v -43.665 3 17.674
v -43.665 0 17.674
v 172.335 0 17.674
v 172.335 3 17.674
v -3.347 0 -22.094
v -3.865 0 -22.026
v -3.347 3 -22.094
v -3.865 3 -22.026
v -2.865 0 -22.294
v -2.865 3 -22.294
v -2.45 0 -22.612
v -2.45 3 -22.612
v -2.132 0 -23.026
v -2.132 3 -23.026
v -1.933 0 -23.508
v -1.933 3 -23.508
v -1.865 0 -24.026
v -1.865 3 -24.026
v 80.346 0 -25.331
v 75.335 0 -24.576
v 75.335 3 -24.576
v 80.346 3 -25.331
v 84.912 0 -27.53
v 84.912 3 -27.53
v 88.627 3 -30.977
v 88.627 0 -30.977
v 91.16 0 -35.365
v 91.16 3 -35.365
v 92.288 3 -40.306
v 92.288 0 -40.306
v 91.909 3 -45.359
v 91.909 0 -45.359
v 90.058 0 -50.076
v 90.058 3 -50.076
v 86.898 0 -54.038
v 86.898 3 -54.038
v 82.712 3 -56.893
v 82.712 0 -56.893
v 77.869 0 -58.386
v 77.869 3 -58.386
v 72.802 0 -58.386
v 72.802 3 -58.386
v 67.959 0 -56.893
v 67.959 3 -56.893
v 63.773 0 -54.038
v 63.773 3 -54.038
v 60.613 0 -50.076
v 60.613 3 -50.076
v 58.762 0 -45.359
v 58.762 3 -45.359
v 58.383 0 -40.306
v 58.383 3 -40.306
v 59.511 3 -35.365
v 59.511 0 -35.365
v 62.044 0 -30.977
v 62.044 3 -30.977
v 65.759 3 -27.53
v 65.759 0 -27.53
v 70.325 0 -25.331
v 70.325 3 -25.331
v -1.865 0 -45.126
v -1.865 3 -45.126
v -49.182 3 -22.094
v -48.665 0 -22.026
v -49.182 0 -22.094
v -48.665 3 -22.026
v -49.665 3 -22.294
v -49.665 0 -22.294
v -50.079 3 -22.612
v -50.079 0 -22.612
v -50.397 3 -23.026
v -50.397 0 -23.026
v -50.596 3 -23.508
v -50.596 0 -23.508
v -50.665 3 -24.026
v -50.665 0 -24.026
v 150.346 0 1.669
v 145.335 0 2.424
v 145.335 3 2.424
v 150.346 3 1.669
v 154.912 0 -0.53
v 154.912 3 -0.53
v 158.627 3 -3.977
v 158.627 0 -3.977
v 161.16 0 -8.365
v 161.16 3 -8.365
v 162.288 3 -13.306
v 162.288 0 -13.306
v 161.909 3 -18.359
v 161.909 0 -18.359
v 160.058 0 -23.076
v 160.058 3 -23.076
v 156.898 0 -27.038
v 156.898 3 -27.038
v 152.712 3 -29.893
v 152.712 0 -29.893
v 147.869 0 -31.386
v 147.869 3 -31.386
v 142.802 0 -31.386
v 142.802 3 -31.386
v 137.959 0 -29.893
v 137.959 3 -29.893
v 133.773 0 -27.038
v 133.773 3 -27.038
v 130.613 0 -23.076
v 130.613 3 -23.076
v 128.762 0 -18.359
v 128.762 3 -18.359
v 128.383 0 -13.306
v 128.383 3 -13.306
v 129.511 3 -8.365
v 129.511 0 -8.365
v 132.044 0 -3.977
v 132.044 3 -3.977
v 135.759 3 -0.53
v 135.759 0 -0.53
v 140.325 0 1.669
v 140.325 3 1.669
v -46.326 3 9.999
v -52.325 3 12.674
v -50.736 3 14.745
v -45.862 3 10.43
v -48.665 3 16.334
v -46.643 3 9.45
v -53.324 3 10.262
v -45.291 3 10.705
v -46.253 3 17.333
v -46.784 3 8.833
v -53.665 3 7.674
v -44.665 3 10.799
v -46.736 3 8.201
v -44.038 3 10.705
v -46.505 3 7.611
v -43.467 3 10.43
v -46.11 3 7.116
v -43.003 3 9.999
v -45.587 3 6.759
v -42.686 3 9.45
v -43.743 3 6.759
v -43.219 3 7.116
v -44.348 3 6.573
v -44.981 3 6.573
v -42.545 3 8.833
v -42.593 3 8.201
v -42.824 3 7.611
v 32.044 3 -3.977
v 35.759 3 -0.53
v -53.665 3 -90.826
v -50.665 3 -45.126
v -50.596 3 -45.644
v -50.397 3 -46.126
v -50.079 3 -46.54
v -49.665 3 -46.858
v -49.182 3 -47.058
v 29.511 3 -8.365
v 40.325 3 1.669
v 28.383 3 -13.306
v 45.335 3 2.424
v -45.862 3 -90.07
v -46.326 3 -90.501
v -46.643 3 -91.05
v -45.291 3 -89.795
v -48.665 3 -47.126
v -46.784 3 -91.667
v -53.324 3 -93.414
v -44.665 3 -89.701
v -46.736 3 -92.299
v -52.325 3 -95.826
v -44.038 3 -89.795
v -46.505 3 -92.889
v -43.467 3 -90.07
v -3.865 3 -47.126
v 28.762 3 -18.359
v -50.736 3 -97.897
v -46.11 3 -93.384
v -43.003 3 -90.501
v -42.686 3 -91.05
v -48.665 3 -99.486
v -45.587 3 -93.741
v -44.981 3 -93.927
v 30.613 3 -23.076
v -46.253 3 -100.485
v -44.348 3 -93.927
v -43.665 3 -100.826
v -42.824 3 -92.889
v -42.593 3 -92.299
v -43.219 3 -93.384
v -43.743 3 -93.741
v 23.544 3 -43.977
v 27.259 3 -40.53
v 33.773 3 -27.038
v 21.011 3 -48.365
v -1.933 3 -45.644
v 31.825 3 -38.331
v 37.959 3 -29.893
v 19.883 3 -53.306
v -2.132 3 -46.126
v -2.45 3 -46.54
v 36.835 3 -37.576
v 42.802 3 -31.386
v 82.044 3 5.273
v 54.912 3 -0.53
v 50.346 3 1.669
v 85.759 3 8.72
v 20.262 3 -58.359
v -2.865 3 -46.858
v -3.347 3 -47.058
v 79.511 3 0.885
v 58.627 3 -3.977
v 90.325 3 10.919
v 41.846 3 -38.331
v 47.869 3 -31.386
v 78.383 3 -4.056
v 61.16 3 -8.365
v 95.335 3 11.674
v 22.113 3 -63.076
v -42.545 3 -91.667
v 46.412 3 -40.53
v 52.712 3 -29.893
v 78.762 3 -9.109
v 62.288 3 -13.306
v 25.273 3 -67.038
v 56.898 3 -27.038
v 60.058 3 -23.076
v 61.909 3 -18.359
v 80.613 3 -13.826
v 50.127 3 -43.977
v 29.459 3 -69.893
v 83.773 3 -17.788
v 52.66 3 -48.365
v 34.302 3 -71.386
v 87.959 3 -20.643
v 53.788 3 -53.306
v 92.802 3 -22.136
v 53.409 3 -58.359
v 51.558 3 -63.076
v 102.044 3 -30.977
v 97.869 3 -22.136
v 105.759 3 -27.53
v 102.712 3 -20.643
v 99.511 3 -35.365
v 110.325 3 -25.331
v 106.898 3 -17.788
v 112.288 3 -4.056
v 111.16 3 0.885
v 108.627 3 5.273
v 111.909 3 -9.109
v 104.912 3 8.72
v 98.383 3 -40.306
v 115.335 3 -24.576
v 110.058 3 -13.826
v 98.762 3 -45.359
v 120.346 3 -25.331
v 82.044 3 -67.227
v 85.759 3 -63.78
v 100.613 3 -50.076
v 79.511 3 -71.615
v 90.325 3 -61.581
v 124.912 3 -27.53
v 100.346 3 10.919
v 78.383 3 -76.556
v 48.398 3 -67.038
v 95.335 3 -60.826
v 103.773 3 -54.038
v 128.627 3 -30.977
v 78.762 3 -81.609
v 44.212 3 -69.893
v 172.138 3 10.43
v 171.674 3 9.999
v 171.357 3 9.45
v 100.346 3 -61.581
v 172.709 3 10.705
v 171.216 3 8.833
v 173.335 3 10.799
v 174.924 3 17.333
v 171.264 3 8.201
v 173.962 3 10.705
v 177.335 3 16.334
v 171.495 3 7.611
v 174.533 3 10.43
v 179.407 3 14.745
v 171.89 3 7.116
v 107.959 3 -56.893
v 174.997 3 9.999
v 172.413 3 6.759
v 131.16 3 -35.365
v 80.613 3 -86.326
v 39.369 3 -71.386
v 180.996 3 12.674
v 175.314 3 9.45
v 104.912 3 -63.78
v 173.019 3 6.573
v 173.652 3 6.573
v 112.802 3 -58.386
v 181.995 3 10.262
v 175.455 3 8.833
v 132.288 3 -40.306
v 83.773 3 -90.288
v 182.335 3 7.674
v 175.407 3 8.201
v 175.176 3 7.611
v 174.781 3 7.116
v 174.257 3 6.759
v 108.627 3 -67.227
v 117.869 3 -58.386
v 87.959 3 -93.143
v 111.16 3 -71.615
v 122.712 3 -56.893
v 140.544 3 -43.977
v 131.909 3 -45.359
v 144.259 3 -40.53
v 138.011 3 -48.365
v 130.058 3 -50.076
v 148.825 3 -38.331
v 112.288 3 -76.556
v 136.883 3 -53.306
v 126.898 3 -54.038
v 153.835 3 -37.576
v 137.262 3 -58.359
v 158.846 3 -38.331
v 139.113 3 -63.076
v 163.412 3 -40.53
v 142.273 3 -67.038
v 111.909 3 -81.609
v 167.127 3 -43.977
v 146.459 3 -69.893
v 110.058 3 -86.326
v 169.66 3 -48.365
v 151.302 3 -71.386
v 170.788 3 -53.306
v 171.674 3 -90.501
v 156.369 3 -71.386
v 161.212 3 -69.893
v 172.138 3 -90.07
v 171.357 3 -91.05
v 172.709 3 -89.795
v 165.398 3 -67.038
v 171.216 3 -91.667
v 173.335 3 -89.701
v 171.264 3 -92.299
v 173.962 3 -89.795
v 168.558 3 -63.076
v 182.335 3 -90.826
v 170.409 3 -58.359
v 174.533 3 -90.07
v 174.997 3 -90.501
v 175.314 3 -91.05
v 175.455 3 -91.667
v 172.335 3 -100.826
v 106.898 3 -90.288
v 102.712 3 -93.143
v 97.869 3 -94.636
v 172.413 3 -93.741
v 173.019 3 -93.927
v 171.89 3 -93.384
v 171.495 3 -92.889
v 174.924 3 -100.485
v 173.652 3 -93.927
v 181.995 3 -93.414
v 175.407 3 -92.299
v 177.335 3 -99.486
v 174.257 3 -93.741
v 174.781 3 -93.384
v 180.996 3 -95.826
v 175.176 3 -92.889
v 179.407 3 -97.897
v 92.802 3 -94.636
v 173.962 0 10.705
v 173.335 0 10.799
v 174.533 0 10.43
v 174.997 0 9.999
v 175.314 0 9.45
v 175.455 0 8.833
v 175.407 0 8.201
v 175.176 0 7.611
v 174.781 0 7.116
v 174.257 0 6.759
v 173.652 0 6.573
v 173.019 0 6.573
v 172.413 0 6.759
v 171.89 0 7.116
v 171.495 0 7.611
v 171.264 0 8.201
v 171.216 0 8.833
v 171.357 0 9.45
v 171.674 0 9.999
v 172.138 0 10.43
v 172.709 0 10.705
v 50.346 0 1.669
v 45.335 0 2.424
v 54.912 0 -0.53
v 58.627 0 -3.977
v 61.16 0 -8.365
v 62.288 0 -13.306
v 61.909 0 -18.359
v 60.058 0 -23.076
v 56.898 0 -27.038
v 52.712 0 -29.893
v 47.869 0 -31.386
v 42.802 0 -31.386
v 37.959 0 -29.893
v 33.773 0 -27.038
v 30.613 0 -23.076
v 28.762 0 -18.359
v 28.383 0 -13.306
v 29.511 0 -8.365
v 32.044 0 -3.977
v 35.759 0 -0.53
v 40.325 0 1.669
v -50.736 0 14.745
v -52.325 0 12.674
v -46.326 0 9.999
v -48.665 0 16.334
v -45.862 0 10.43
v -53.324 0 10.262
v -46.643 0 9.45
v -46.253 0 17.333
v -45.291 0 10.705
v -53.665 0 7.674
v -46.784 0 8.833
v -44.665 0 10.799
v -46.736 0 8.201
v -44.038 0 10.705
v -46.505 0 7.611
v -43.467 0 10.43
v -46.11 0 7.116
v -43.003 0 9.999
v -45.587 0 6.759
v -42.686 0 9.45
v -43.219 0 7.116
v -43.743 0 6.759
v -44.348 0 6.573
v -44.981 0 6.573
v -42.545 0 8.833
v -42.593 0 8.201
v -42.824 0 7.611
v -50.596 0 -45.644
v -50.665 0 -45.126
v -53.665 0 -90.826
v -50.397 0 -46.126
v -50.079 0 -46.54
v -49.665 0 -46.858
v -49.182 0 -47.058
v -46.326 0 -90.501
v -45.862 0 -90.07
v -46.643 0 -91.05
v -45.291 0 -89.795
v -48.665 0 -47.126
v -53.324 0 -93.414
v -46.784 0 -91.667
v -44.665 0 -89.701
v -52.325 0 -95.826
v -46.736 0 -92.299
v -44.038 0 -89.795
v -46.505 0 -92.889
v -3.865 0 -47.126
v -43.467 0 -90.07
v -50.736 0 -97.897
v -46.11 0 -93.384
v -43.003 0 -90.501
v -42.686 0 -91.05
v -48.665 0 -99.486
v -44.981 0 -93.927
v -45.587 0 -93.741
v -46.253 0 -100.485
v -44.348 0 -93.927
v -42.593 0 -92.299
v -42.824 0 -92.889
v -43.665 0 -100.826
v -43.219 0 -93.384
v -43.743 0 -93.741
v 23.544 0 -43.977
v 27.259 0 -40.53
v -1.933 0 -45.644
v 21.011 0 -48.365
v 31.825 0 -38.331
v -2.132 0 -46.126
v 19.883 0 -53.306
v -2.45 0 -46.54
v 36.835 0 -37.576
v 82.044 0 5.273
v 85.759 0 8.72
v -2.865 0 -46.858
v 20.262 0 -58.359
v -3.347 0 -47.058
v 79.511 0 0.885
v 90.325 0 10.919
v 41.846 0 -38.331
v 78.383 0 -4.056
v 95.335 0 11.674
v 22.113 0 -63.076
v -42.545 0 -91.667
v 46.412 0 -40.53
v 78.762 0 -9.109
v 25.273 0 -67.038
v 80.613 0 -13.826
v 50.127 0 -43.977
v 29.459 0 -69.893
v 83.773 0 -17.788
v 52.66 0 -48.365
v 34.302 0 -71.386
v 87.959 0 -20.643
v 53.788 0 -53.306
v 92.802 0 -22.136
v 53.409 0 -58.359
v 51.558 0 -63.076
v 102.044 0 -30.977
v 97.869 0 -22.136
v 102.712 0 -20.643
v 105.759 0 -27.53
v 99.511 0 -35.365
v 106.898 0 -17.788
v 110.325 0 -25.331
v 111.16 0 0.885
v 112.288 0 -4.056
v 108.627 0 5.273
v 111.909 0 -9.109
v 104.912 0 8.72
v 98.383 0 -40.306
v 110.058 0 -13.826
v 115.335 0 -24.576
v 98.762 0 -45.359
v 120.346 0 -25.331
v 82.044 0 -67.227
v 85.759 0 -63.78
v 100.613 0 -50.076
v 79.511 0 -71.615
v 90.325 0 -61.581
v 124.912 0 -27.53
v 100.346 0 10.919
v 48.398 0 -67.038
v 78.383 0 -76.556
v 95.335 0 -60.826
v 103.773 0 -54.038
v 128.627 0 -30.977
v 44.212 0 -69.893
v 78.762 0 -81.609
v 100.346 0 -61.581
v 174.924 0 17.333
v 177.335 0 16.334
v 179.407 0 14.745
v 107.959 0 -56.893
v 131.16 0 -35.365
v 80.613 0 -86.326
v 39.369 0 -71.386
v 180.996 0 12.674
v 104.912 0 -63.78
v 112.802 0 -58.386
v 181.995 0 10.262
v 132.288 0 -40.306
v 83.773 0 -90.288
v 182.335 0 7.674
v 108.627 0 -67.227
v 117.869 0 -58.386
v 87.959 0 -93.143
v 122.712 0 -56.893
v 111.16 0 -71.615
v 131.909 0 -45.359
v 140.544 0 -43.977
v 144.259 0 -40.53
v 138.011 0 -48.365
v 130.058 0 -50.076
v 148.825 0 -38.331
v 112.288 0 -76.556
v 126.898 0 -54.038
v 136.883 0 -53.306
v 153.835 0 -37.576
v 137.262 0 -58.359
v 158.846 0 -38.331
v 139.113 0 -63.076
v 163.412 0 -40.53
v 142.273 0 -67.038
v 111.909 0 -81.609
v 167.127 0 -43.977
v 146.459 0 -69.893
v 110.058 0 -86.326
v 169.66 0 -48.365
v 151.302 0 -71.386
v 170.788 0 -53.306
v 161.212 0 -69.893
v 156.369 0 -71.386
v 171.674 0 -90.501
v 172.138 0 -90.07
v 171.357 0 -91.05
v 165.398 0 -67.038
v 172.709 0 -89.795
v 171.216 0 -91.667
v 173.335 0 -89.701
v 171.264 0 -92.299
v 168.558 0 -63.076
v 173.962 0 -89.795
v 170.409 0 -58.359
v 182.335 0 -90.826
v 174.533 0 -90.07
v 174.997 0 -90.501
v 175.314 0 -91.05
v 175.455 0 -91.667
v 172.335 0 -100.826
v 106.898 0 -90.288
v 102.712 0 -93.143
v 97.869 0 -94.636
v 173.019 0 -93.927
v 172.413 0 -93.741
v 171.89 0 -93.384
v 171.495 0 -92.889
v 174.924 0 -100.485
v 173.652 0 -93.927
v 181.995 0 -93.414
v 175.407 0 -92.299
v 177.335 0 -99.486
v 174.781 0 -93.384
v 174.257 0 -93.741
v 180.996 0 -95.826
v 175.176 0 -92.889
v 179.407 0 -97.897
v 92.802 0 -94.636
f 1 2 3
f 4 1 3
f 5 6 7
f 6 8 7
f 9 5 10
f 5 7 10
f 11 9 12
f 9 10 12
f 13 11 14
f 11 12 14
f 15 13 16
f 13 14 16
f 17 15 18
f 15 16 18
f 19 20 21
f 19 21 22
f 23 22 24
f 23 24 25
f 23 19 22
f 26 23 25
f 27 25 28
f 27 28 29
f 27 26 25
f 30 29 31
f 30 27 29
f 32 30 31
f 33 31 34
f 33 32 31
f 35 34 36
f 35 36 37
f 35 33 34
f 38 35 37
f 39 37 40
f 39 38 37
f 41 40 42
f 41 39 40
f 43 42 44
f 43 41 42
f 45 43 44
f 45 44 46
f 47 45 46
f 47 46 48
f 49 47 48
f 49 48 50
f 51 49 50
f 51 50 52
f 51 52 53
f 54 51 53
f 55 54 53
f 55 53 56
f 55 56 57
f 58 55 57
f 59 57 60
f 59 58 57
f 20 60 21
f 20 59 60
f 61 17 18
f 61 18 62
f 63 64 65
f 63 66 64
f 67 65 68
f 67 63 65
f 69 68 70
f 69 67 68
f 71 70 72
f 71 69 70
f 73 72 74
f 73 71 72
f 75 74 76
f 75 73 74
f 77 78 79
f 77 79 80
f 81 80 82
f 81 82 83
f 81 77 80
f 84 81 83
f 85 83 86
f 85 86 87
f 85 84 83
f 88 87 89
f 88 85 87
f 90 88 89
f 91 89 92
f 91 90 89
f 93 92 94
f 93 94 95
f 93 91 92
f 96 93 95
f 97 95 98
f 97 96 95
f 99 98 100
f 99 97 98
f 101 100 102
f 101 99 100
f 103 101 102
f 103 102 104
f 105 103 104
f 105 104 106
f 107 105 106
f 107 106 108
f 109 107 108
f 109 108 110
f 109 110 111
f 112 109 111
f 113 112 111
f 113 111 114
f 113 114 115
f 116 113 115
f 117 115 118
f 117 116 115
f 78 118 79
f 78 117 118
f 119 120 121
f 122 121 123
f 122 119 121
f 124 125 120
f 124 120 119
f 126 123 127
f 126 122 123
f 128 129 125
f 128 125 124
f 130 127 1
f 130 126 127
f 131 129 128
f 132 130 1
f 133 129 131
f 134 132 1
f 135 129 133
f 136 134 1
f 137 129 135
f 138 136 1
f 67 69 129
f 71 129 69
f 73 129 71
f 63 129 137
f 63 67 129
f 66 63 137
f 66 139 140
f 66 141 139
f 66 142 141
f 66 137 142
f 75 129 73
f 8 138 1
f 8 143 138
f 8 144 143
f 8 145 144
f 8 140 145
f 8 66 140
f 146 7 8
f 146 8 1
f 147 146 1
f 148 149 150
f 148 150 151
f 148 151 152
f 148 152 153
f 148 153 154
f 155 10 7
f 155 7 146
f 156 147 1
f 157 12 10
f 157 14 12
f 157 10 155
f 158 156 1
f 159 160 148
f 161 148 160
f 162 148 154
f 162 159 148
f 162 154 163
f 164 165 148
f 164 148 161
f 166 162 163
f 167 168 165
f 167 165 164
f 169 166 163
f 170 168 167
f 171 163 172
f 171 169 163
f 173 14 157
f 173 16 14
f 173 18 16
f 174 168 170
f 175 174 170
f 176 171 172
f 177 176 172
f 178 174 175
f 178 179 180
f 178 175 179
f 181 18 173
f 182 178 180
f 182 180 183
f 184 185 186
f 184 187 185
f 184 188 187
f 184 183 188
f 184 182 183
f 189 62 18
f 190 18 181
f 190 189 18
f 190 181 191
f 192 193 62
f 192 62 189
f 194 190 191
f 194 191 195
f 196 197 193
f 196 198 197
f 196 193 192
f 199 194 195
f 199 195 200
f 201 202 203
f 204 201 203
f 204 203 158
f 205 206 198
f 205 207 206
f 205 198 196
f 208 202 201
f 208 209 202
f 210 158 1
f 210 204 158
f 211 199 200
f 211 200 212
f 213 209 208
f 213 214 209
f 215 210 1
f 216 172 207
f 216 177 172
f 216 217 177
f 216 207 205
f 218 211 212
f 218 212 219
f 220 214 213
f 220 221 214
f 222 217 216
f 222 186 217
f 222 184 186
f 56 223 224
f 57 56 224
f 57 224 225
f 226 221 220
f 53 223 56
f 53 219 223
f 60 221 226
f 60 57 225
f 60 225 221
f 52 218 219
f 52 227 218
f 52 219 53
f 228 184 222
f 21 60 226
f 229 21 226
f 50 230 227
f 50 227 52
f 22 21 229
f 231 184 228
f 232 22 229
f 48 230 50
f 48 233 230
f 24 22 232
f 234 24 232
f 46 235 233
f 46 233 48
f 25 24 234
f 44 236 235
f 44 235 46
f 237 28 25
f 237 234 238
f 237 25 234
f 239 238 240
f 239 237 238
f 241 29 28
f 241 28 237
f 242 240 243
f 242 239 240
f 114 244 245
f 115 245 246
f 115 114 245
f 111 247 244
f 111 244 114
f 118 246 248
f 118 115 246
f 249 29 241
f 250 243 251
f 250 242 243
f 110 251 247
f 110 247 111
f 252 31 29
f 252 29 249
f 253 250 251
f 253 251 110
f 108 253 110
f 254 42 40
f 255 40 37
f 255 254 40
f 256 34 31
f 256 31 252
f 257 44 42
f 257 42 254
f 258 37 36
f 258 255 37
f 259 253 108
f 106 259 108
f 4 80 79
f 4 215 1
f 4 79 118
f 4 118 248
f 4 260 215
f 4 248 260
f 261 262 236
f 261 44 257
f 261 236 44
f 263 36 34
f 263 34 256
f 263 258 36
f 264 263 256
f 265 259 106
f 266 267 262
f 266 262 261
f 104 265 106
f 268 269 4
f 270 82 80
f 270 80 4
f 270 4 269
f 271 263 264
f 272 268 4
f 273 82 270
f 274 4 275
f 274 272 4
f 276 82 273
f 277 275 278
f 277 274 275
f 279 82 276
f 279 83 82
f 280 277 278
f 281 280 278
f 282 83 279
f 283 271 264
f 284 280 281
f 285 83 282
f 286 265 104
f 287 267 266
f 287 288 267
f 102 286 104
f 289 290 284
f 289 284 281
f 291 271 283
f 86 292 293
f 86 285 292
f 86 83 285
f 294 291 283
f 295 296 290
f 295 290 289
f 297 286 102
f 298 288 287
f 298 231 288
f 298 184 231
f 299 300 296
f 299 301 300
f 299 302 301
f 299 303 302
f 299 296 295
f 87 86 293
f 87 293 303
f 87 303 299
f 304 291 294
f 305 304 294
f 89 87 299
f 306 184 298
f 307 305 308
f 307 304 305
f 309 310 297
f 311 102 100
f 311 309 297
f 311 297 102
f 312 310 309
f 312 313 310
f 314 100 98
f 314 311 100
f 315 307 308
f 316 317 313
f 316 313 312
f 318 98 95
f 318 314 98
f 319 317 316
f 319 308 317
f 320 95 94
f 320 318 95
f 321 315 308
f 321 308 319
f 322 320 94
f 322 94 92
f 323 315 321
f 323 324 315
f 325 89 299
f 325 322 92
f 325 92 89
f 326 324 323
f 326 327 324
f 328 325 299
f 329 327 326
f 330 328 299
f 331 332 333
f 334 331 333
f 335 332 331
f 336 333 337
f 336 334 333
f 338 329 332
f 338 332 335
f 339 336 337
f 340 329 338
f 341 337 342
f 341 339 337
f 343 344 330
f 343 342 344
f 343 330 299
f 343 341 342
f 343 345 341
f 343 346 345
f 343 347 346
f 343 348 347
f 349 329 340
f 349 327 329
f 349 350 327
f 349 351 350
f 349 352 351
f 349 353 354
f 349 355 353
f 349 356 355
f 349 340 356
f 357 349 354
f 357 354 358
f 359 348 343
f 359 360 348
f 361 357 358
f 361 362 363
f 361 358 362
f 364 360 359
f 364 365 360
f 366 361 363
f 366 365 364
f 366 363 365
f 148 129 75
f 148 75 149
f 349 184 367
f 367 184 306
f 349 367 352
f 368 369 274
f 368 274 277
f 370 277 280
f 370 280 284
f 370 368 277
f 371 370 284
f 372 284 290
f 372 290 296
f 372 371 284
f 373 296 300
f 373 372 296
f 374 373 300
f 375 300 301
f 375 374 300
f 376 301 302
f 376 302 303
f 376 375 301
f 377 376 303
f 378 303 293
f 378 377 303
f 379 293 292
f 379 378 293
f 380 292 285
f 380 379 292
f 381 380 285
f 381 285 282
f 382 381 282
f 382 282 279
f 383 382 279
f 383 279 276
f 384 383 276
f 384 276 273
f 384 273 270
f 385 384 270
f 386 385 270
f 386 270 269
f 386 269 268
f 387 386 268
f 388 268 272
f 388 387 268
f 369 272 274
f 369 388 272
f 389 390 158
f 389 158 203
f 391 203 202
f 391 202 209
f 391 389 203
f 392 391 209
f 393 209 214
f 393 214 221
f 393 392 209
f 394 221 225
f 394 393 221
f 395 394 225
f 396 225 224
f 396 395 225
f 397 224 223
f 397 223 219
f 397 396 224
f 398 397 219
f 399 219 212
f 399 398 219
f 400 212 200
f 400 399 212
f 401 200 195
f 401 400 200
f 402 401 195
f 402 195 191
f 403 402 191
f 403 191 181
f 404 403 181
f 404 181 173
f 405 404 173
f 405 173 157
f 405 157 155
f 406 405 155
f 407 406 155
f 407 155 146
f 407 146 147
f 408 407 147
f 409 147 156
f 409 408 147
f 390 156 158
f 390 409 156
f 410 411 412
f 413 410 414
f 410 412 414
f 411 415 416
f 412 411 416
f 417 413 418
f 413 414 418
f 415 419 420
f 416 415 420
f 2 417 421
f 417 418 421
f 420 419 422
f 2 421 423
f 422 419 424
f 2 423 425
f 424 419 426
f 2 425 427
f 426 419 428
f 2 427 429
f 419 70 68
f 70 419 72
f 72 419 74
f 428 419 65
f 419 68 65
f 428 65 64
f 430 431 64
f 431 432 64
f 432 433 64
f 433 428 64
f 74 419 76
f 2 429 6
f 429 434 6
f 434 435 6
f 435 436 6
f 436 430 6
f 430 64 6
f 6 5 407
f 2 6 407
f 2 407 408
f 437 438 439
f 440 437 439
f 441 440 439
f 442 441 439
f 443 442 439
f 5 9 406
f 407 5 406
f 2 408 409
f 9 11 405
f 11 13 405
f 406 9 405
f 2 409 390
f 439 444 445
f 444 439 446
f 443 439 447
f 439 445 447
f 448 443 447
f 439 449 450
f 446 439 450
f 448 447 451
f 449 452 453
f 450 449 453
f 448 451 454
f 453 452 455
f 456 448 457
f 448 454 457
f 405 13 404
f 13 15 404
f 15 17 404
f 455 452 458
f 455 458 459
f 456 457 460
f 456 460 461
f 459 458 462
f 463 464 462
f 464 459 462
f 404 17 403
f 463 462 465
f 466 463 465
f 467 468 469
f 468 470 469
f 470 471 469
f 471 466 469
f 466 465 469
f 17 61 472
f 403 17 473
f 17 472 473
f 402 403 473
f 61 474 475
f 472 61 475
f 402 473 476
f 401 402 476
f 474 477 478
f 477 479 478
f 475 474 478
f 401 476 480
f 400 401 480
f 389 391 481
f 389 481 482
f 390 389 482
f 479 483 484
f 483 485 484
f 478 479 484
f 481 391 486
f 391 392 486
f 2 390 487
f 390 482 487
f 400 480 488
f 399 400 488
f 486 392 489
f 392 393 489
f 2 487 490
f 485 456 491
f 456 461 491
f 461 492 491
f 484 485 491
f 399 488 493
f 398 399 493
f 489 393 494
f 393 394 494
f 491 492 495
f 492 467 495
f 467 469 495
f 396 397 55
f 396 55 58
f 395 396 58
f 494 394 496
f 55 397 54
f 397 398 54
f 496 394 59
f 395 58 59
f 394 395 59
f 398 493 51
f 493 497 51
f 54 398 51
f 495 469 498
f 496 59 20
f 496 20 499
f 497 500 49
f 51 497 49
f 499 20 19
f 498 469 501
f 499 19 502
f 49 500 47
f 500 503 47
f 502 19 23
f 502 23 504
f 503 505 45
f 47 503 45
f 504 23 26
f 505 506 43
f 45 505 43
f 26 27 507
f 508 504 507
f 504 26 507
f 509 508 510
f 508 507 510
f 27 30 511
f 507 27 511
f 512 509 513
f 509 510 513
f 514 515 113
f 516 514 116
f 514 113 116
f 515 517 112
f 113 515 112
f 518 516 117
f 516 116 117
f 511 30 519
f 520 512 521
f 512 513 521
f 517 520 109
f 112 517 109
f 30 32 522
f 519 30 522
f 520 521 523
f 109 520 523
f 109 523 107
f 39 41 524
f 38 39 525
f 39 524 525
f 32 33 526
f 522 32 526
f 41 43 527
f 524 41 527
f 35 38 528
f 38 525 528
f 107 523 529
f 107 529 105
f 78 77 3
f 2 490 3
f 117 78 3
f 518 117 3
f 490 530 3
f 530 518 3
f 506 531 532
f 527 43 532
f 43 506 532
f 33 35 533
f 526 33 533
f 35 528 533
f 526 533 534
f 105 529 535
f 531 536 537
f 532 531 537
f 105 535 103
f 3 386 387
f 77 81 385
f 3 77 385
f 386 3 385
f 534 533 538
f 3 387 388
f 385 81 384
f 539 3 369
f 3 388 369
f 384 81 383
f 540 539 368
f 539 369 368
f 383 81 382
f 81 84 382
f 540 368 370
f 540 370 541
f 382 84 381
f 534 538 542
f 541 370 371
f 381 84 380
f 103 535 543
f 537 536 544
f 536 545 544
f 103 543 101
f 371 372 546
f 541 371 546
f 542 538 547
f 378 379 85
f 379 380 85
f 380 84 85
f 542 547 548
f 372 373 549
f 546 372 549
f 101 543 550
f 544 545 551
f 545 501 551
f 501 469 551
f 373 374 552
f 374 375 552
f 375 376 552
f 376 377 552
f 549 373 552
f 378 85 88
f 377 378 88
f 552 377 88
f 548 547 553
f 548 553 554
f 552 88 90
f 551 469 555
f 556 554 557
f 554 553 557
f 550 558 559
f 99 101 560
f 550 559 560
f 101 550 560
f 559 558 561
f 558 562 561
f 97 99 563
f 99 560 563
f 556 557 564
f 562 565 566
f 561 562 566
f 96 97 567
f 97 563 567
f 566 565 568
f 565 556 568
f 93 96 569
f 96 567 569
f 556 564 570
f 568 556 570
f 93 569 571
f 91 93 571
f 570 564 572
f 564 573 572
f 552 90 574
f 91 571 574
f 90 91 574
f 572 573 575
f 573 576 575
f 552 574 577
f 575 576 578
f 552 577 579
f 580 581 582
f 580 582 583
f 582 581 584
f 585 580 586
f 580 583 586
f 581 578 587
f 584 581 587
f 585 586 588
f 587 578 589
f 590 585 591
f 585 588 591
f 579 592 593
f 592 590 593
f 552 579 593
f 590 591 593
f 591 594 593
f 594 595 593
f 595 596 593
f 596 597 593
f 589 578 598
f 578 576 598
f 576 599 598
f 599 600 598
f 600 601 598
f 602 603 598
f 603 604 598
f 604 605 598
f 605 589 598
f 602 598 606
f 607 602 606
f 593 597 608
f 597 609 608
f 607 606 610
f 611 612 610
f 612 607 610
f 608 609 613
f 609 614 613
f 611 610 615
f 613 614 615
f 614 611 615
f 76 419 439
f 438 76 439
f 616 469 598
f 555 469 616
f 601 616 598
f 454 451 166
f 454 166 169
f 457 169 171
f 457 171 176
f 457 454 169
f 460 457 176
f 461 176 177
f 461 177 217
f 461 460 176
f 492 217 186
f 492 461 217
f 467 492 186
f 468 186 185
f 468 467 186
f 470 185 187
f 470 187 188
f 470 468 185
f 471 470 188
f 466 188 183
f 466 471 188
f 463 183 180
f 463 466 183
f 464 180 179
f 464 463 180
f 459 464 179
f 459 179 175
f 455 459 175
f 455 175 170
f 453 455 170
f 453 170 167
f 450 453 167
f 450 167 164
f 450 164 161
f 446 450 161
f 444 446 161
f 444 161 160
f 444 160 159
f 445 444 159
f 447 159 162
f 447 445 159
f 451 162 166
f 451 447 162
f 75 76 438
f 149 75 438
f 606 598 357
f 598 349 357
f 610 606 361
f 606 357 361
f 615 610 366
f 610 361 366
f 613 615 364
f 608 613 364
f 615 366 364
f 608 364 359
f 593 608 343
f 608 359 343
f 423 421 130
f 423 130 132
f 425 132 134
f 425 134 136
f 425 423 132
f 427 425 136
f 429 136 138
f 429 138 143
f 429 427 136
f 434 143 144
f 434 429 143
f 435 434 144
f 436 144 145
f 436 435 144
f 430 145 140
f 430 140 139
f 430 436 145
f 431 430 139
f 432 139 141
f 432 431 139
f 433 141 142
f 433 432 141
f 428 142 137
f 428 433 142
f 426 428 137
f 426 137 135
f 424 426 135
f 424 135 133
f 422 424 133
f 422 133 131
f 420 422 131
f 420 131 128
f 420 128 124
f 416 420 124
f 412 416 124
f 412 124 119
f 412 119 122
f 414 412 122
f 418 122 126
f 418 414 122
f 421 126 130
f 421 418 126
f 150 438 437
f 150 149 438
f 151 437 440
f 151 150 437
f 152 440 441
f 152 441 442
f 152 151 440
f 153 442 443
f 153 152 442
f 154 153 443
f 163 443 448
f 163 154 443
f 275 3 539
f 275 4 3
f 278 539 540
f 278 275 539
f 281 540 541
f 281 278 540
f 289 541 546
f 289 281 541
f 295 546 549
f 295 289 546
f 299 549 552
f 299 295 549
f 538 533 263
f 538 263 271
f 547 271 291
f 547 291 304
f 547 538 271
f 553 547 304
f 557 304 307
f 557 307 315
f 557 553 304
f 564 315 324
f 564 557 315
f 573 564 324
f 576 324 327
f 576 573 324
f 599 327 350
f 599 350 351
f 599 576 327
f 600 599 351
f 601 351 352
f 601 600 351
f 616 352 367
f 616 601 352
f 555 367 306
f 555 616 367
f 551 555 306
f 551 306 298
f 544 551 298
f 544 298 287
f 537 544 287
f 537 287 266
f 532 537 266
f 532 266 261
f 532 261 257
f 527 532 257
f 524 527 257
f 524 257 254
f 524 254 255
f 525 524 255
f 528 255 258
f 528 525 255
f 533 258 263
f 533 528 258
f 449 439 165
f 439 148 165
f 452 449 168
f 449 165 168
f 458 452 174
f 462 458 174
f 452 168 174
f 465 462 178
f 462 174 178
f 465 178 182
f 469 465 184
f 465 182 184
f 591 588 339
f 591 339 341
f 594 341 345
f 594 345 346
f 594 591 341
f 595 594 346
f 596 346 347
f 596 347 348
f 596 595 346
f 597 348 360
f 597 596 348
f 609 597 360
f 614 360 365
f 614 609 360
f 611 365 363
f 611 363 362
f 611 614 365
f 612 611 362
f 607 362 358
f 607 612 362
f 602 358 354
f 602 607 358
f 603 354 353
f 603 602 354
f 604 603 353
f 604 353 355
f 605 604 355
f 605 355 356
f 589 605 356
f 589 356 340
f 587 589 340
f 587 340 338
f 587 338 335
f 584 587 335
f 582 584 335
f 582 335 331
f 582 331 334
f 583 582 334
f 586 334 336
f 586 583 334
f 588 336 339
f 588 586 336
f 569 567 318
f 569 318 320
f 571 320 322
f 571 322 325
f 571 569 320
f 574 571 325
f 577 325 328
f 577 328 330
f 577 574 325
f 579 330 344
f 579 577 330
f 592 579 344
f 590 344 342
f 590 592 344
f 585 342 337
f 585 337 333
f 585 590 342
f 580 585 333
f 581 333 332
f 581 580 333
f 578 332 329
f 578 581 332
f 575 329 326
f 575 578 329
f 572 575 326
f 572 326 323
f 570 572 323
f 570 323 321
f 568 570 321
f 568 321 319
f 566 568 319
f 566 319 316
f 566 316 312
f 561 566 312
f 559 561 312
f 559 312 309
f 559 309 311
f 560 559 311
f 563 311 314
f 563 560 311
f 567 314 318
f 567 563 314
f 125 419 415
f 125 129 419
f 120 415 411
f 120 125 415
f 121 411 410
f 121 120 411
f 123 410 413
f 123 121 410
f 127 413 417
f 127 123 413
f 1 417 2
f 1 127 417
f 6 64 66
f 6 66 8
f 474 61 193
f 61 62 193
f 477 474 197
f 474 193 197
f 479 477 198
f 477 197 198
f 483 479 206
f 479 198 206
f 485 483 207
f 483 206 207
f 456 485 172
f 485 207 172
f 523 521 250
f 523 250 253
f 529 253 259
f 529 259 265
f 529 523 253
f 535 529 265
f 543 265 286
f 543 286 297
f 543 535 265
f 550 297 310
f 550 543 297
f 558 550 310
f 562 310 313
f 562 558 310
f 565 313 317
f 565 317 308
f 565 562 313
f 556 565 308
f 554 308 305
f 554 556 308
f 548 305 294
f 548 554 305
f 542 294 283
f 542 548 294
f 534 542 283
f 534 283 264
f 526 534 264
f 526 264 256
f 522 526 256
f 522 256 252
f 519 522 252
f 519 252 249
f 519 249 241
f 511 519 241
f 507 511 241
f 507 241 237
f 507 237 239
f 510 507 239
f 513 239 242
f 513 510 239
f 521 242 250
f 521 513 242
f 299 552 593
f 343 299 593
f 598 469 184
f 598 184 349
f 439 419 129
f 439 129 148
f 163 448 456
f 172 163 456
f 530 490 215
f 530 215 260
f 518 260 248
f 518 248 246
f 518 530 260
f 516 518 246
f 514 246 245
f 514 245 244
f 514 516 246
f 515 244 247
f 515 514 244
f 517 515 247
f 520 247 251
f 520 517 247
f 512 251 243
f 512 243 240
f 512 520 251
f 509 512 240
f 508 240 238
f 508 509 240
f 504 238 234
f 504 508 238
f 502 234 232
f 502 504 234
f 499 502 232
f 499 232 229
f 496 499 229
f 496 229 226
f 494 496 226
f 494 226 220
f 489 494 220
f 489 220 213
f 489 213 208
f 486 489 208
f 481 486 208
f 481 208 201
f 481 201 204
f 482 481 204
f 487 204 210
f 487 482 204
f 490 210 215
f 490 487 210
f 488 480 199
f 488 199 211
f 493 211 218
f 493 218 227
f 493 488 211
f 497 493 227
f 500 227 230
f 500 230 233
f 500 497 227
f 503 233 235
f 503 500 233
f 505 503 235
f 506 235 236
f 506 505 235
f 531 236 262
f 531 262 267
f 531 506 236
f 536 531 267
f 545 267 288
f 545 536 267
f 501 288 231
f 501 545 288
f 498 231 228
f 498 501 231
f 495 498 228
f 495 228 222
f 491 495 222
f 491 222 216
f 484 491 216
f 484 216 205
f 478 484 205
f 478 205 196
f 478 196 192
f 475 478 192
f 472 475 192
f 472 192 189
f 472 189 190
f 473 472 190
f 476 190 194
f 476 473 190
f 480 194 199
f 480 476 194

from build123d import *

# Parameters (mm, degrees)
SKETCH1_W           = 236
SKETCH1_H           = 118.5
SKETCH1_W_2         = 48.8
SKETCH1_H_2         = 25.1
SKETCH1_R           = 17
SKETCH1_R_2         = 2.125
BOSS_EXTRUDE1_DEPTH = 3
FILLET1_R           = 10
FILLET2_R           = 2


with BuildPart() as part:
    # Sketch1 → Boss-Extrude1 (new body)
    with BuildSketch(Plane(origin=(0, 0, 0), x_dir=(1, 0, 0), z_dir=(0, 1, 0))):
        with Locations((64.335496373, 41.57608502)):
            Rectangle(SKETCH1_W, SKETCH1_H)
        with Locations((-26.264503627, 34.57608502)):
            Rectangle(SKETCH1_W_2, SKETCH1_H_2, mode=Mode.SUBTRACT)
        with Locations(Location((75.335496373, 41.57608502, 0), (0, 0, 270))):
            Circle(SKETCH1_R, mode=Mode.SUBTRACT)
        with Locations(Location((115.335496373, 41.57608502, 0), (0, 0, 270))):
            Circle(SKETCH1_R, mode=Mode.SUBTRACT)
        with Locations(Location((153.835496373, 54.57608502, 0), (0, 0, 270))):
            Circle(SKETCH1_R, mode=Mode.SUBTRACT)
        with Locations(Location((95.335496373, 77.82608502, 0), (0, 0, 270))):
            Circle(SKETCH1_R, mode=Mode.SUBTRACT)
        with Locations(Location((173.335496373, 91.82608502, 0), (0, 0, 270))):
            Circle(SKETCH1_R_2, mode=Mode.SUBTRACT)
        with Locations(Location((-44.664503627, -8.67391498, 0), (0, 0, 270))):
            Circle(SKETCH1_R_2, mode=Mode.SUBTRACT)
        with Locations(Location((45.335496373, 14.57608502, 0), (0, 0, 270))):
            Circle(SKETCH1_R, mode=Mode.SUBTRACT)
        with Locations(Location((95.335496373, 5.32608502, 0), (0, 0, 270))):
            Circle(SKETCH1_R, mode=Mode.SUBTRACT)
        with Locations(Location((173.335496373, -8.67391498, 0), (0, 0, 270))):
            Circle(SKETCH1_R_2, mode=Mode.SUBTRACT)
        with Locations(Location((145.335496373, 14.57608502, 0), (0, 0, 270))):
            Circle(SKETCH1_R, mode=Mode.SUBTRACT)
        with Locations(Location((36.835496373, 54.57608502, 0), (0, 0, 270))):
            Circle(SKETCH1_R, mode=Mode.SUBTRACT)
        with Locations(Location((-44.664503627, 91.82608502, 0), (0, 0, 270))):
            Circle(SKETCH1_R_2, mode=Mode.SUBTRACT)
    extrude(amount=BOSS_EXTRUDE1_DEPTH)

    # Fillet1
    fillet1_edges = [part.edges().sort_by_distance(p)[0] for p in [
        (182.335496373, 1.5, -100.82608502),
        (182.335496373, 1.5, 17.67391498),
        (-53.664503627, 1.5, 17.67391498),
        (-53.664503627, 1.5, -100.82608502),
    ]]
    fillet(fillet1_edges, radius=FILLET1_R)

    # Fillet2
    fillet2_edges = [part.edges().sort_by_distance(p)[0] for p in [
        (-50.664503627, 1.5, -22.02608502),
        (-1.864503627, 1.5, -22.02608502),
        (-1.864503627, 1.5, -47.12608502),
        (-50.664503627, 1.5, -47.12608502),
    ]]
    fillet(fillet2_edges, radius=FILLET2_R)


solid = part.part
